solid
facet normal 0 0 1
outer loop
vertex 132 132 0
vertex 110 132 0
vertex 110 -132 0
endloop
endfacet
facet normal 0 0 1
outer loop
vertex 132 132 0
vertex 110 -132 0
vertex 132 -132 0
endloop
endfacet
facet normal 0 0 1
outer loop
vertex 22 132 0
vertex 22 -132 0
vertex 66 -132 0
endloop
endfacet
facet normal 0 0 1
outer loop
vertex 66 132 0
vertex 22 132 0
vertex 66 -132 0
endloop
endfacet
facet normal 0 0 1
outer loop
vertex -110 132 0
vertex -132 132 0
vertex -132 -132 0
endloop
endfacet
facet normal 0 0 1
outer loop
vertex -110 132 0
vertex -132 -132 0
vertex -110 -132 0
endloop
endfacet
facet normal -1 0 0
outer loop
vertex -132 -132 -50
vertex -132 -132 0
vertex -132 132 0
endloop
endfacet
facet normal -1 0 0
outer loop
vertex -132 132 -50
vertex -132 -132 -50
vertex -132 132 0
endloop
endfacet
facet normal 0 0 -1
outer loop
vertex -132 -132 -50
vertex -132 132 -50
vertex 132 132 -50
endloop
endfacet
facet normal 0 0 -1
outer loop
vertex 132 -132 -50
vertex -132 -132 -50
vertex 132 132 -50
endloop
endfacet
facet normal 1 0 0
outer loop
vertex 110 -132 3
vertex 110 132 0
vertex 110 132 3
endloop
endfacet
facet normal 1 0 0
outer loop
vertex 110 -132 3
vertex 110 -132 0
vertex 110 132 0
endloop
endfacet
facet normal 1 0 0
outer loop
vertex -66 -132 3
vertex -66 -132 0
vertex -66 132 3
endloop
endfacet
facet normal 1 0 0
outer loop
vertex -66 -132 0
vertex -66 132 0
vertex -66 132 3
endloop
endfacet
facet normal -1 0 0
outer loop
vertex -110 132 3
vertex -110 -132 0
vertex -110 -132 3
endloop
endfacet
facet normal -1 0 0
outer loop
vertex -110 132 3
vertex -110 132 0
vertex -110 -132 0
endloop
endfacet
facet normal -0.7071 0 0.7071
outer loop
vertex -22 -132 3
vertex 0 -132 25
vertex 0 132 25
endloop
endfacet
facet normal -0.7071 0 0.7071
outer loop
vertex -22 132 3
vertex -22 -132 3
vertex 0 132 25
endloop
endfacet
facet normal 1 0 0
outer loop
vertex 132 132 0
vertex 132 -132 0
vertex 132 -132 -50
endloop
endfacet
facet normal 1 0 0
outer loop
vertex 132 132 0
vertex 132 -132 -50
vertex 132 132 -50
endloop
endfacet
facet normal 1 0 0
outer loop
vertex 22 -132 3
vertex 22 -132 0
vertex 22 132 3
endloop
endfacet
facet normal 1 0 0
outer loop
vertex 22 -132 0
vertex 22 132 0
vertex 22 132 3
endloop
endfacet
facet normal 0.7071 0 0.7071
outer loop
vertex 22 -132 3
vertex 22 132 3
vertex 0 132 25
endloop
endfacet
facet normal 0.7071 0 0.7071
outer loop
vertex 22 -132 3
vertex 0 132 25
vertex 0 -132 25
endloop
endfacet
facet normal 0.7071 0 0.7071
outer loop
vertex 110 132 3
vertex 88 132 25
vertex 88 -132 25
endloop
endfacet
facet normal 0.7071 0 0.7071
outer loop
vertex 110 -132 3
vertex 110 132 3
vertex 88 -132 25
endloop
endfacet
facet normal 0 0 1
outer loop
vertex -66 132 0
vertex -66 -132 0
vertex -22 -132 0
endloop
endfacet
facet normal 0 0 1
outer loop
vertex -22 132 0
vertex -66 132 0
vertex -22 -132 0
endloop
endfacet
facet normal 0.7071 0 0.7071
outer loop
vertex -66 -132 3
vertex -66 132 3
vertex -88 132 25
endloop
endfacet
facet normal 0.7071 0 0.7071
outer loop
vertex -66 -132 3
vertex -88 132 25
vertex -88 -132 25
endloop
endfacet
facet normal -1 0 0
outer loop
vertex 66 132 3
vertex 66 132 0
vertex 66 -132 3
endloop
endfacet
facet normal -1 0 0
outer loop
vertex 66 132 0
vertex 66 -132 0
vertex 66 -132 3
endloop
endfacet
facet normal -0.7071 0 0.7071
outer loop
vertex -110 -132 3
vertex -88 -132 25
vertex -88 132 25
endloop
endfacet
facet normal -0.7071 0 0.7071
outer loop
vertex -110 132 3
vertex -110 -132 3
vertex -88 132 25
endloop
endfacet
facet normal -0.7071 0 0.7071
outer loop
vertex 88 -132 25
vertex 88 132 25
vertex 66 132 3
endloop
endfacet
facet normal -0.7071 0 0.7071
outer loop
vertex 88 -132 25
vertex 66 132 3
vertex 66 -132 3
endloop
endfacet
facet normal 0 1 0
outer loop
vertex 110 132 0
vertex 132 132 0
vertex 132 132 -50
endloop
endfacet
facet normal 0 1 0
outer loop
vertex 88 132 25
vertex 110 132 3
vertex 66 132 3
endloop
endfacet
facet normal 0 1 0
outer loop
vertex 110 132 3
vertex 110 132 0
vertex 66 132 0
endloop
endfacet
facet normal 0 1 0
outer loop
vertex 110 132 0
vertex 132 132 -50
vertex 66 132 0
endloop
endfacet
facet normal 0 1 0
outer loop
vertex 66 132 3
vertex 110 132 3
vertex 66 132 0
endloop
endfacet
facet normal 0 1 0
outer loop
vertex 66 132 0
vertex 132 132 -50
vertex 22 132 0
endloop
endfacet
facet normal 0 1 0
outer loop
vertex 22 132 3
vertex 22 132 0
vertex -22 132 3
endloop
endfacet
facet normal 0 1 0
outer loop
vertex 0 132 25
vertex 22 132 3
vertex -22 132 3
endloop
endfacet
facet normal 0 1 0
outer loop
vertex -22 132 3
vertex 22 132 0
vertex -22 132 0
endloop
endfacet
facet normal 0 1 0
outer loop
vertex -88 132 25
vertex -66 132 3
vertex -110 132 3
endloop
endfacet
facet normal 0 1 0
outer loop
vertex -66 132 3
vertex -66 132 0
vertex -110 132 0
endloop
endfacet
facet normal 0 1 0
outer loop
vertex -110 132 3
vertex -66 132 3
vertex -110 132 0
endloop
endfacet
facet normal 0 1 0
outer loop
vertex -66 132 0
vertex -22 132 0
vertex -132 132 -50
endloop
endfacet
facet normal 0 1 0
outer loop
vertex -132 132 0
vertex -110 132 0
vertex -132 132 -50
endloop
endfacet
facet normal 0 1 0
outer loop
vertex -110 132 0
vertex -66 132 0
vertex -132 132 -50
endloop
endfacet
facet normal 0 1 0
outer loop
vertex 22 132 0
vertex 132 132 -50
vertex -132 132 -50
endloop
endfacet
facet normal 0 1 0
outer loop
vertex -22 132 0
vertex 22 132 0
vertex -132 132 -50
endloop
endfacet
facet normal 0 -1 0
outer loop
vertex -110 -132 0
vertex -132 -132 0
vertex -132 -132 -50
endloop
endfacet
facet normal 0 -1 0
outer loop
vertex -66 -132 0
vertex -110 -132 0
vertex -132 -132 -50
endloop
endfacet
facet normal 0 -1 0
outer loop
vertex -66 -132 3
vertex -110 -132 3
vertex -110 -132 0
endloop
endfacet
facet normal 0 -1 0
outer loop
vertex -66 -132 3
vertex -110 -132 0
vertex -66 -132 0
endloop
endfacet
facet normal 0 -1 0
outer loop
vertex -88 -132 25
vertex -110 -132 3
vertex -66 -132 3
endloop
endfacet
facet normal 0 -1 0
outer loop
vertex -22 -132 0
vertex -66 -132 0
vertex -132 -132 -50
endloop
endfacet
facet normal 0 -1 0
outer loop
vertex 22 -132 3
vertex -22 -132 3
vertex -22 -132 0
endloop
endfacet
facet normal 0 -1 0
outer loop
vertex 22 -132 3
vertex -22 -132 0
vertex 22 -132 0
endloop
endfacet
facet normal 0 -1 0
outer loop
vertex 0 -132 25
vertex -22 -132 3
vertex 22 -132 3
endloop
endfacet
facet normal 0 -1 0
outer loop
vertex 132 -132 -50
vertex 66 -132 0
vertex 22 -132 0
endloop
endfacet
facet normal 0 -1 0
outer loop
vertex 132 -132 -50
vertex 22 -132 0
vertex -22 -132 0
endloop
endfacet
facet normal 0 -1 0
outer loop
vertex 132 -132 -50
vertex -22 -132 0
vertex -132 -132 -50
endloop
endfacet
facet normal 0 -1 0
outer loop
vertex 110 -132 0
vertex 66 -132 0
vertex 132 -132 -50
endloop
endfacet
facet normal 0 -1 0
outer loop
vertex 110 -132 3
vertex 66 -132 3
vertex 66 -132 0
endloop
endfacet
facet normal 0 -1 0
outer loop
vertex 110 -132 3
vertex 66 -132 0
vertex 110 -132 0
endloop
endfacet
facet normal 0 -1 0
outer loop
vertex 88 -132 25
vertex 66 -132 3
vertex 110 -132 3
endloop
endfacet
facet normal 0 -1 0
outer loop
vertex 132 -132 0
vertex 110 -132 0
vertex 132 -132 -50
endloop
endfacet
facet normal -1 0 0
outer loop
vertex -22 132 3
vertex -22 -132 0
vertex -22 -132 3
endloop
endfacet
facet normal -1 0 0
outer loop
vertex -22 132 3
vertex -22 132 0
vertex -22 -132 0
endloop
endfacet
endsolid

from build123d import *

# Parameters (mm, degrees)
F0_W     = 44
F0_H     = 44
F1_DEPTH = 25
F0_W_2   = 264
F0_H_2   = 264
F4_DEPTH = 50
F5_DEPTH = 44
F6_DEPTH = 22
F7_SIZE  = 21.99999


# Not quite as in the source:
# - a fillet or chamfer is up to 0.001 mm smaller than in the source, because OpenCascade refuses the exact size


with BuildPart() as f1:
    # F0 (on Top) → F1 (new body)
    with BuildSketch(Plane.XY):
        with Locations((-88, 88)):
            Rectangle(F0_W, F0_H)
    extrude(amount=F1_DEPTH)


with BuildPart() as f1b:
    # F0 (on Top) → F1, piece 2 (new body)
    with BuildSketch(Plane.XY):
        with Locations((0, 88)):
            Rectangle(F0_W, F0_H)
    extrude(amount=F1_DEPTH)


with BuildPart() as f1c:
    # F0 (on Top) → F1, piece 3 (new body)
    with BuildSketch(Plane.XY):
        Rectangle(F0_W, F0_H)
    extrude(amount=F1_DEPTH)


with BuildPart() as f1d:
    # F0 (on Top) → F1, piece 4 (new body)
    with BuildSketch(Plane.XY):
        with Locations((-88, 0)):
            Rectangle(F0_W, F0_H)
    extrude(amount=F1_DEPTH)


with BuildPart() as f2_1:
    # F2: instance of F1d
    add(f1d.part.mirror(Plane.YZ))


with BuildPart() as f2_2:
    # F2: instance of F1
    add(f1.part.mirror(Plane.YZ))


with BuildPart() as f3_1:
    # F3: instance of F1
    add(f1.part.mirror(Plane.XZ))


with BuildPart() as f3_2:
    # F3: instance of F1b
    add(f1b.part.mirror(Plane.XZ))


with BuildPart() as f3_3:
    # F3: instance of F2_2
    add(f2_2.part.mirror(Plane.XZ))


with BuildPart() as f1_1:
    add(f1.part)

    add(f1b.part)  # F4 merges F1b

    add(f1c.part)  # F4 merges F1c

    add(f1d.part)  # F4 merges F1d

    add(f2_1.part)  # F4 merges F2_1

    add(f2_2.part)  # F4 merges F2_2

    add(f3_1.part)  # F4 merges F3_1

    add(f3_2.part)  # F4 merges F3_2

    add(f3_3.part)  # F4 merges F3_3
    # F0 (on Top) → F4 (join)
    with BuildSketch(Plane.XY):
        Rectangle(F0_W_2, F0_H_2)
        with Locations((-88, 0)):
            Rectangle(F0_W, F0_H, mode=Mode.SUBTRACT)
        with Locations((-88, 88)):
            Rectangle(F0_W, F0_H, mode=Mode.SUBTRACT)
        Rectangle(F0_W, F0_H, mode=Mode.SUBTRACT)
        with Locations((0, 88)):
            Rectangle(F0_W, F0_H, mode=Mode.SUBTRACT)
        with Locations((-88, 0)):
            Rectangle(F0_W, F0_H)
        Rectangle(F0_W, F0_H)
        with Locations((-88, 88)):
            Rectangle(F0_W, F0_H)
        with Locations((0, 88)):
            Rectangle(F0_W, F0_H)
    extrude(amount=-F4_DEPTH)

    # F5 (add): faces of the model
    f5_faces = [f1_1.faces().sort_by_distance(p)[0] for p in [
        (-88, -66, 12.5),
        (-88, 22, 12.5),
        (0, 22, 12.5),
        (0, -66, 12.5),
        (88, -66, 12.5),
        (88, 22, 12.5),
    ]]
    extrude(f5_faces, amount=F5_DEPTH)

    # F6 (add, symmetric): faces of the model
    f6_faces = [f1_1.faces().sort_by_distance(p)[0] for p in [
        (-88, -110, 12.5),
        (0, -110, 12.5),
        (88, -110, 12.5),
        (-88, 110, 12.5),
        (0, 110, 12.5),
        (88, 110, 12.5),
    ]]
    extrude(f6_faces, amount=F6_DEPTH, both=True, dir=(0, -1, 0))

    # F7 (size 22 in the source; OpenCascade refuses exactly that, so slightly less here)
    f7_edges = [f1_1.edges().sort_by_distance(p)[0] for p in [
        (-110, 0, 25),
        (-66, 0, 25),
        (-22, 0, 25),
        (22, 0, 25),
        (110, 0, 25),
        (66, 0, 25),
    ]]
    chamfer(f7_edges, length=F7_SIZE)


solid = f1_1.part
